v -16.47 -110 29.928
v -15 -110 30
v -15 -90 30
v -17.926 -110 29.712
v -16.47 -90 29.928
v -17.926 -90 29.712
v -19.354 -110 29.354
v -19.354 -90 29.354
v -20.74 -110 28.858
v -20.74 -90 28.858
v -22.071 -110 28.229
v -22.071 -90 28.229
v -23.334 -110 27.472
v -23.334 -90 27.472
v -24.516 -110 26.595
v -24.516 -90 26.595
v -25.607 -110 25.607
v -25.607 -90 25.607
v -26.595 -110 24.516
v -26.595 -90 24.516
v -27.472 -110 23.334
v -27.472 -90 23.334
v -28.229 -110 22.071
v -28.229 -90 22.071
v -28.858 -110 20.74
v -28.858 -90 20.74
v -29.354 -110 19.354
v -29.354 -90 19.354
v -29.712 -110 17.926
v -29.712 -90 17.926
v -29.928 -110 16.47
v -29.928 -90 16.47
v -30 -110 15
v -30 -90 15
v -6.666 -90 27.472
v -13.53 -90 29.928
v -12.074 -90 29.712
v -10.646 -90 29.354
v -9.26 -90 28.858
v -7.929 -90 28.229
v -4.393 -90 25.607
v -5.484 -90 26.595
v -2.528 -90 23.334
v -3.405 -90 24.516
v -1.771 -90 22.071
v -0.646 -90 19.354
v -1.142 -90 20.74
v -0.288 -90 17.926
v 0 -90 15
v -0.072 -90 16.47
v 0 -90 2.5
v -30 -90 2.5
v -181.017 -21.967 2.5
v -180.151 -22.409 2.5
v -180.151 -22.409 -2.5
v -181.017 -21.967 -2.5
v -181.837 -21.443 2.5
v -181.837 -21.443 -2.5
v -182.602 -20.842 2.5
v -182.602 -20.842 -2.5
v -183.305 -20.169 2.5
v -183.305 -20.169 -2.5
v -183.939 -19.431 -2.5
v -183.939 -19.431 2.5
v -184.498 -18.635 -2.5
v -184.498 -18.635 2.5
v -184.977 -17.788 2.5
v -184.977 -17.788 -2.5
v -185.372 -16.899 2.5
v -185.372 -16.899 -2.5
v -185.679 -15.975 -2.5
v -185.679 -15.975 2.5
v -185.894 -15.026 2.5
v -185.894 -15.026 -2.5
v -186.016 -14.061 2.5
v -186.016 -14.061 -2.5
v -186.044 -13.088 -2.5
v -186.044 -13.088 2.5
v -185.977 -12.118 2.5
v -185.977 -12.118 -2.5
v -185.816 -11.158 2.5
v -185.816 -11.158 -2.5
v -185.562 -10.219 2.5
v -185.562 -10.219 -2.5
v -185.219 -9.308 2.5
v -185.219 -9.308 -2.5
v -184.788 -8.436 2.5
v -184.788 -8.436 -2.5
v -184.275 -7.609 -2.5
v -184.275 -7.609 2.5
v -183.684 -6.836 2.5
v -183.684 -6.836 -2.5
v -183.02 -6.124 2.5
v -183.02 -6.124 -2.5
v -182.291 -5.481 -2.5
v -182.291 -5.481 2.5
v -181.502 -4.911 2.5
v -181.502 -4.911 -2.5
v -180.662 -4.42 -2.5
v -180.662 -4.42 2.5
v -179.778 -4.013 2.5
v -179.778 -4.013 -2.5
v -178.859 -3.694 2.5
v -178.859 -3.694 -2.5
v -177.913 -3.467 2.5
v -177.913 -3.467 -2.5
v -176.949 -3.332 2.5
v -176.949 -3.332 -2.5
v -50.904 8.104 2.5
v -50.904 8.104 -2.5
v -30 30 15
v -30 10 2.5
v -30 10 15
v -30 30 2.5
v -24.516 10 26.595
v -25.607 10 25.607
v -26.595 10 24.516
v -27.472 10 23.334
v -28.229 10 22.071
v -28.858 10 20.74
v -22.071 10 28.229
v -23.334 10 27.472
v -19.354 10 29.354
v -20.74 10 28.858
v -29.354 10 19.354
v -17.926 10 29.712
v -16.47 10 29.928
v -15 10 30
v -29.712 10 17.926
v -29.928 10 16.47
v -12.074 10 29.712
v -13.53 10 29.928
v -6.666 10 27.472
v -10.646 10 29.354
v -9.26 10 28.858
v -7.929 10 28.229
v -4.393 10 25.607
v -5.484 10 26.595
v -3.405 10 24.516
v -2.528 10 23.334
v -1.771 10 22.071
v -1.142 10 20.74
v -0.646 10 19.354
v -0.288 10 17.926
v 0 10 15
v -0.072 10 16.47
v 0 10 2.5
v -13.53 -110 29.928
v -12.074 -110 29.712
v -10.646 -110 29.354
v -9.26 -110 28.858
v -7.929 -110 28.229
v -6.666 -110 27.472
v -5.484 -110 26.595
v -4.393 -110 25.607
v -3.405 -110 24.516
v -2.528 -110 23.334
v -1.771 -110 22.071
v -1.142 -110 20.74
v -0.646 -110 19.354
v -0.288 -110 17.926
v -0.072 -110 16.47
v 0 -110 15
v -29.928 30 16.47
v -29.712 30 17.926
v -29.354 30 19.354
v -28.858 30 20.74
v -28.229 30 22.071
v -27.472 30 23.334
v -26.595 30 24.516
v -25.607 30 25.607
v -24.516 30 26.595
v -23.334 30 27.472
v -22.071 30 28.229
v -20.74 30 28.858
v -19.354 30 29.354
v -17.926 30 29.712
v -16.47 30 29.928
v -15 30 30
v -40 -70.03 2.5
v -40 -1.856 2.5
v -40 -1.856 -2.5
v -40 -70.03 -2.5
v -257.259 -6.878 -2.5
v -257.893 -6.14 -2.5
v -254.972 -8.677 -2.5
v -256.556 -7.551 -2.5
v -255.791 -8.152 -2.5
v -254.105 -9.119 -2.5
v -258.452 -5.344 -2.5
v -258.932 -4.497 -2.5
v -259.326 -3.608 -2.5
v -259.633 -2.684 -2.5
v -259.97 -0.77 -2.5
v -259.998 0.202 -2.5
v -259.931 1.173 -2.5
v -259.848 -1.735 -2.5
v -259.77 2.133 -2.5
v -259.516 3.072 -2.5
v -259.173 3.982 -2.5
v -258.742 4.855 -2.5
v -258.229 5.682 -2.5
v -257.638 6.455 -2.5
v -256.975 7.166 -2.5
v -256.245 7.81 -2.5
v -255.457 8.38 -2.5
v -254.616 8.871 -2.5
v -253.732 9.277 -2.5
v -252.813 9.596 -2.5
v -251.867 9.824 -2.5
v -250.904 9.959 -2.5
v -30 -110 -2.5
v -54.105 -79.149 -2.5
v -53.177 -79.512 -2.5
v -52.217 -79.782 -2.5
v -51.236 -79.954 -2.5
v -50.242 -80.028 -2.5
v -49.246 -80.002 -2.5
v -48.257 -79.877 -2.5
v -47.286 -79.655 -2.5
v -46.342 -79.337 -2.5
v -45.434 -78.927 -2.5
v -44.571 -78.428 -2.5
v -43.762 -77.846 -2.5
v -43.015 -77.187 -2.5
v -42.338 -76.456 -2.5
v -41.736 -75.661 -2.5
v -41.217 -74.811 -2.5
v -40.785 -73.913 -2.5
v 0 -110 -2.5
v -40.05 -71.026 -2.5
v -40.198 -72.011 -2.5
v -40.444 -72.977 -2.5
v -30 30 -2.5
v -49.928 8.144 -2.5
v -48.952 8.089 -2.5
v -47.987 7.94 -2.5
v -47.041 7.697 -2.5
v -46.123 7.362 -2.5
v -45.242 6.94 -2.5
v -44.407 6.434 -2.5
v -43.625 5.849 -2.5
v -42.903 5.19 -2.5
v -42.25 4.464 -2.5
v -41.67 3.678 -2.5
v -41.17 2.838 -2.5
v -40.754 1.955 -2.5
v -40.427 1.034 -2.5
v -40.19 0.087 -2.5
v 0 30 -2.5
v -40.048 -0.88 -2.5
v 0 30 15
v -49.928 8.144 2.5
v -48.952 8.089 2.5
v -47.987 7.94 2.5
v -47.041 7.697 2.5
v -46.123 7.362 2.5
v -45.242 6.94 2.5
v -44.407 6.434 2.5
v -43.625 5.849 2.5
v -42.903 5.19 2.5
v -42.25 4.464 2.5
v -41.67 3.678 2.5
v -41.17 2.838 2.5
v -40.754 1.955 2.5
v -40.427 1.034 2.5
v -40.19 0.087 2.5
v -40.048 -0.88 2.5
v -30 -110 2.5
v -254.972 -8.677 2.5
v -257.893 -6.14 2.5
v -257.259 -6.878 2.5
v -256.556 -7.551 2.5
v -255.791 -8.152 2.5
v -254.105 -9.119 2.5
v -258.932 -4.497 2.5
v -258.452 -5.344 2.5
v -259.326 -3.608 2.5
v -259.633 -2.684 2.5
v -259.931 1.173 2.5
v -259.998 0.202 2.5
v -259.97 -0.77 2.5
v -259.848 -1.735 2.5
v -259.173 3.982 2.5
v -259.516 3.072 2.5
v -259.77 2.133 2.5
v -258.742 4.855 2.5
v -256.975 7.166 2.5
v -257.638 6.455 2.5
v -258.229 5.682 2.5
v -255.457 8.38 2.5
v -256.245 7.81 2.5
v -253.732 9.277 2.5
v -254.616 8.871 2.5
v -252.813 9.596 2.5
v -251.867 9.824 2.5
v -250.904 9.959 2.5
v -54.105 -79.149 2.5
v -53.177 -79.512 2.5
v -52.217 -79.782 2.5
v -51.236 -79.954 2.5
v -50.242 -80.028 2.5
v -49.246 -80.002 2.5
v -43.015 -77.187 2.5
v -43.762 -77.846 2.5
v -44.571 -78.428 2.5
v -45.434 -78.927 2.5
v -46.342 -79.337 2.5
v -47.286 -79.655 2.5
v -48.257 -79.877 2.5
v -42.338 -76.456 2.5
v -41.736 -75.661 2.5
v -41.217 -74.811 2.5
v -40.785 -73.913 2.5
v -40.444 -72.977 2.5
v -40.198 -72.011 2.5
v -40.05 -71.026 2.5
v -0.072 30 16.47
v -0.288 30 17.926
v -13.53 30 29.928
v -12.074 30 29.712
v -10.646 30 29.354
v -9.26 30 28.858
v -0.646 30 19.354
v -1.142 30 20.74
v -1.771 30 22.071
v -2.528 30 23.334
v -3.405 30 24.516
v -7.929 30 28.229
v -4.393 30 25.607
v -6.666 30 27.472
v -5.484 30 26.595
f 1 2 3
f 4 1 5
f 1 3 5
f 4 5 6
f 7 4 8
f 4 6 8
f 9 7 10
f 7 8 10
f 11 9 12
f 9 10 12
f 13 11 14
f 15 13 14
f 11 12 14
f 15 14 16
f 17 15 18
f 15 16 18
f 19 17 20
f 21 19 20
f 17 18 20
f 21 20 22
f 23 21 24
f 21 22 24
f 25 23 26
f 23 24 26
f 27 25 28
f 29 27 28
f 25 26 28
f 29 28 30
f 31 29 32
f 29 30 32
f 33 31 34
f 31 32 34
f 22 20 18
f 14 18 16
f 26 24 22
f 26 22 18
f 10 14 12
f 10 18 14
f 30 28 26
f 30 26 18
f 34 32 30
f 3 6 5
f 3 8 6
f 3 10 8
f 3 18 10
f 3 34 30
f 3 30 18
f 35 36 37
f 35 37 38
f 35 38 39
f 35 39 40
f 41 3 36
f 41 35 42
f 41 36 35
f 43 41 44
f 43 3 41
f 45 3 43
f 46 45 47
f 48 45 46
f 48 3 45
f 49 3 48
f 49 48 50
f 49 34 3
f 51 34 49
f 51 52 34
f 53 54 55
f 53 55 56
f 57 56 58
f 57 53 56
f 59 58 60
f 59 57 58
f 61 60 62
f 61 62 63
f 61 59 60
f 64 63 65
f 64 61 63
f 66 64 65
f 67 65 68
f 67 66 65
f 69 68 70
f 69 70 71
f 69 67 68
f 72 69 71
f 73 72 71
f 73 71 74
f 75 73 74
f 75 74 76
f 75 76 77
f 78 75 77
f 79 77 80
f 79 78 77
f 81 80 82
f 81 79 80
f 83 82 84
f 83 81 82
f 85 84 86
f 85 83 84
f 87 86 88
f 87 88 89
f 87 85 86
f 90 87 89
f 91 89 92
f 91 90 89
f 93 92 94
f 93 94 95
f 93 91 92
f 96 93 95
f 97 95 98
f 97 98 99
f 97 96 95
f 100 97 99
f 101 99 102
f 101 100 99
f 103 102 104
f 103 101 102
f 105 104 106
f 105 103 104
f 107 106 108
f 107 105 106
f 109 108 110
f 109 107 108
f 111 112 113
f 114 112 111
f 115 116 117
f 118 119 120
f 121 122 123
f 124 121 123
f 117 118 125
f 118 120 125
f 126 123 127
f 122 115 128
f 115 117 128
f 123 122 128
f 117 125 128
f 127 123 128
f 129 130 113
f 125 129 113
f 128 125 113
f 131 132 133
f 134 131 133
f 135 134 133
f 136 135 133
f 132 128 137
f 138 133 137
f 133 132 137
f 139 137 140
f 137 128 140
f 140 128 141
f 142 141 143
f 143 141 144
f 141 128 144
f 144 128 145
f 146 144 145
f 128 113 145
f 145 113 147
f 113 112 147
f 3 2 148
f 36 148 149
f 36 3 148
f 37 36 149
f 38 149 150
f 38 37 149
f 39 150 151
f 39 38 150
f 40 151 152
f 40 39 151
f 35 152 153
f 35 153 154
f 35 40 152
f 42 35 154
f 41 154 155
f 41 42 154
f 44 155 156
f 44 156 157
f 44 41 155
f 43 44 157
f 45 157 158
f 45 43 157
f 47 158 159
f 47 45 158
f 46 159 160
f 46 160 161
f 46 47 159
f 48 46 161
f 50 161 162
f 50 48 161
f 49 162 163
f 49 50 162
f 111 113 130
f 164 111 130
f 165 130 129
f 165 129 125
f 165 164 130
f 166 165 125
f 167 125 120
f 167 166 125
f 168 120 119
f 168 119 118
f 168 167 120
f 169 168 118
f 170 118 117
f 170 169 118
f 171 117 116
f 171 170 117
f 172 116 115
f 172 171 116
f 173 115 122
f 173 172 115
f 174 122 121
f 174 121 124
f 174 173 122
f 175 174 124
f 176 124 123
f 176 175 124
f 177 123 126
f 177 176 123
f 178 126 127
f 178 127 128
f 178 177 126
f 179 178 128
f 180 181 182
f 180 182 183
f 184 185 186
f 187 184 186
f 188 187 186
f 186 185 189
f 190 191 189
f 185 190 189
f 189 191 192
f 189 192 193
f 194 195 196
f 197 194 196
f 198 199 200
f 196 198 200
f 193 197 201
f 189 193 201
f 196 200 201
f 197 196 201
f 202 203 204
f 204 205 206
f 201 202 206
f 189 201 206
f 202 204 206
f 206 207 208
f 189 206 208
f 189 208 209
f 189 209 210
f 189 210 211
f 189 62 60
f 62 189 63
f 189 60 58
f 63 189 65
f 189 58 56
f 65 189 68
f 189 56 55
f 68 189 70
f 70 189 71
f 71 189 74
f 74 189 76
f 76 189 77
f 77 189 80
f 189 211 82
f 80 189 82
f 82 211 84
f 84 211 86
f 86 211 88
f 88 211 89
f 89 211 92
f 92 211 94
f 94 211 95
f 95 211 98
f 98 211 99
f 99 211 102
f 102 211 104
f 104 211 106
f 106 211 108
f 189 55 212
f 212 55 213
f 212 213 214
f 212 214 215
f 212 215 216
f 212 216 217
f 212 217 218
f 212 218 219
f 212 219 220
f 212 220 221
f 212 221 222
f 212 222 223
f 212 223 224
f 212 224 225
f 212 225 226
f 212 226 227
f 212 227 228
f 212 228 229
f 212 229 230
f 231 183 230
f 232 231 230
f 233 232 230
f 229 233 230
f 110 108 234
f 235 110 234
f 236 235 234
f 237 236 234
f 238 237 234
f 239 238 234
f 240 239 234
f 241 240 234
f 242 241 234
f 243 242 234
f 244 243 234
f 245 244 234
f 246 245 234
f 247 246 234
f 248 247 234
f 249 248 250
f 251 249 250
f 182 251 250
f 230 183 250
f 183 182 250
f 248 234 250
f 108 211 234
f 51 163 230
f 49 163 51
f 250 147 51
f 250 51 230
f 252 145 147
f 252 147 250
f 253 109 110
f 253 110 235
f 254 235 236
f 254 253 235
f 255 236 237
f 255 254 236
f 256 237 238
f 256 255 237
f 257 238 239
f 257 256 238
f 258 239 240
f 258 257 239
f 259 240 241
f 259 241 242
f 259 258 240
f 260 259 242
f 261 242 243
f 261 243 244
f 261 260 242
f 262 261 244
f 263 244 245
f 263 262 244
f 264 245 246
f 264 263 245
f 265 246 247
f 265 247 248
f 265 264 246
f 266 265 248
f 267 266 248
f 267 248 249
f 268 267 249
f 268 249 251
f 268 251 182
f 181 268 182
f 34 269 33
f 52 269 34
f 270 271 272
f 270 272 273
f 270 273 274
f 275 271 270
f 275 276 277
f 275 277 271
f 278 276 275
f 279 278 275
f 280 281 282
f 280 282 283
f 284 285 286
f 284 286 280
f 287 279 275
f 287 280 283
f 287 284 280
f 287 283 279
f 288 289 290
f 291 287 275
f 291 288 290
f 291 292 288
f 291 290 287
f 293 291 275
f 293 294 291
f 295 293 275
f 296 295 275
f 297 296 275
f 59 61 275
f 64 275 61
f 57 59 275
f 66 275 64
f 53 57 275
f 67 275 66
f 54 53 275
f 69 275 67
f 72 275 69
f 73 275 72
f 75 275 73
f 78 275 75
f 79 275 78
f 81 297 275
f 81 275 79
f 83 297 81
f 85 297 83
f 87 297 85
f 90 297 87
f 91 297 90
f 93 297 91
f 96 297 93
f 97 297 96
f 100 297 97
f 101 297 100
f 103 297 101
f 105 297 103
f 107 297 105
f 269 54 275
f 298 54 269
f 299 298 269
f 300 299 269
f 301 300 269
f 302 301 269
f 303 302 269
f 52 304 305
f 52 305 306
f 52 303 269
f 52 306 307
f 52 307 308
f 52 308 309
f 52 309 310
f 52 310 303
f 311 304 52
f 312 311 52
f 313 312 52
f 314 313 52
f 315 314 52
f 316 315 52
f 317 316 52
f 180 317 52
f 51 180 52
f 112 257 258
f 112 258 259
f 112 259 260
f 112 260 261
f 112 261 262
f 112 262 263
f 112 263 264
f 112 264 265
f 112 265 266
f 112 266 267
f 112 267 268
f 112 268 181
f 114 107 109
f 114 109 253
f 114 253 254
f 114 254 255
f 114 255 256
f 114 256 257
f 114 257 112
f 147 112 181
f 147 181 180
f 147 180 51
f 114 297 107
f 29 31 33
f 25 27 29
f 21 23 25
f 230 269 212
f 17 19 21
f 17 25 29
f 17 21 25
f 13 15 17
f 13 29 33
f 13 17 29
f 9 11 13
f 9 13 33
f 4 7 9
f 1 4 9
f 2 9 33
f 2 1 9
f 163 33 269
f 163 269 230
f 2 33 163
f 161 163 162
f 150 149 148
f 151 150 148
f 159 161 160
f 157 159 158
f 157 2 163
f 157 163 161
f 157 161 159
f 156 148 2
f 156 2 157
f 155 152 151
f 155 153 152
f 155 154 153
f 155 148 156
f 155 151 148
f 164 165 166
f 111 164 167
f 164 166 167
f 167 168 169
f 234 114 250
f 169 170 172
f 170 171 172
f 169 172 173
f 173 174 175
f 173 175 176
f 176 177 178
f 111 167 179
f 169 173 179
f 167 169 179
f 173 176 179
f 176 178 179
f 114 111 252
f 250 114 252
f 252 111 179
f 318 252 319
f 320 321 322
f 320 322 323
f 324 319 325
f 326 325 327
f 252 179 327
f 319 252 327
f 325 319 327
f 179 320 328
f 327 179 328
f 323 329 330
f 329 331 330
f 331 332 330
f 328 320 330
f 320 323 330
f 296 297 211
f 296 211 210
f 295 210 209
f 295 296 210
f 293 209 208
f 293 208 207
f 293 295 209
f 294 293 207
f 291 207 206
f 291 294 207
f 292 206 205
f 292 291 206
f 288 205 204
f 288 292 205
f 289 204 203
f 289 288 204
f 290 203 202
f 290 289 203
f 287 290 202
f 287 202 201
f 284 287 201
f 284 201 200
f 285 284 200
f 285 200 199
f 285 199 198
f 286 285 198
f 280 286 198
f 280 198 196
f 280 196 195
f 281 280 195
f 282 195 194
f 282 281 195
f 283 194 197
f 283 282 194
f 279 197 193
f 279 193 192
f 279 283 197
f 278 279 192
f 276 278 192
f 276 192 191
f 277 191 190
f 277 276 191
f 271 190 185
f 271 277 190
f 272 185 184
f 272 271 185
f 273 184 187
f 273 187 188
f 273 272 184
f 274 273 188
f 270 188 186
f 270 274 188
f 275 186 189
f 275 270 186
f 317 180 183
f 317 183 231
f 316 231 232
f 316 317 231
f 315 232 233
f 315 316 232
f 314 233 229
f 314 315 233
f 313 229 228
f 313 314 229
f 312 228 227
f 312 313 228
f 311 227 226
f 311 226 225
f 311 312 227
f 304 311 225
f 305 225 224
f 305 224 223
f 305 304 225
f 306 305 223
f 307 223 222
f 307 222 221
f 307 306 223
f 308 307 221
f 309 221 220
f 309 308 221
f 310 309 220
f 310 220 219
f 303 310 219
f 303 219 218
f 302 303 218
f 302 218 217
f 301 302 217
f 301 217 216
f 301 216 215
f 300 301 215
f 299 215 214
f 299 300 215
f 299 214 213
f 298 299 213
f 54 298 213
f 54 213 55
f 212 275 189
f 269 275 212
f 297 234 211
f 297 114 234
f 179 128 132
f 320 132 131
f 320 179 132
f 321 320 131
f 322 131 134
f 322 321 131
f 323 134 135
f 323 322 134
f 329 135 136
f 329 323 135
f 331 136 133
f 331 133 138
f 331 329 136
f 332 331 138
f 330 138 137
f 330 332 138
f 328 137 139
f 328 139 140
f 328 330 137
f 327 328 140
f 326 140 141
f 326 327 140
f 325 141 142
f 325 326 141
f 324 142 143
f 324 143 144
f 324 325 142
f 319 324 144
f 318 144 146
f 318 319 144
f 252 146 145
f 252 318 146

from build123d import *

# Parameters (mm, degrees)
F0_W     = 30
F0_H     = 20
F0_H_2   = 100
F1_DEPTH = 2.5
F2_DEPTH = 30
F3_R     = 14.99999


# Not quite as in the source:
# - a fillet or chamfer is up to 0.001 mm smaller than in the source, because OpenCascade refuses the exact size


with BuildPart() as f1:
    # F0 (on Top) → F1 (new body, symmetric)
    with BuildSketch(Plane.XY):
        with BuildLine():
            Line((-30, 10), (-30, 30))
            Line((-30, 30), (-250.9035135708, 9.9590995189))
            ThreePointArc((-250.9035135708, 9.9590995189), (-243.2559335601, 7.3836012794), (-240, 0))
            ThreePointArc((-240, 0), (-244.5708205421, -8.3978574895), (-254.1048020827, -9.1186950745))
            Line((-254.1048020827, -9.1186950745), (-30, -110))
            Line((-30, -110), (-30, -90))
            Line((-30, -90), (-30, 10))
        make_face()
        with BuildLine():
            ThreePointArc((-50.9035135708, 8.1035827434), (-43.2559335601, 5.5280845039), (-40, -1.8555167755))
            Line((-40, -1.8555167755), (-40, -70.0304714473))
            ThreePointArc((-40, -70.0304714473), (-44.5708205421, -78.4283289367), (-54.1048020827, -79.1491665218))
            Line((-54.1048020827, -79.1491665218), (-180.1505302804, -22.409384854))
            ThreePointArc((-180.1505302804, -22.409384854), (-185.9078460259, -11.6358085325), (-176.9492417684, -3.3315902606))
            Line((-176.9492417684, -3.3315902606), (-50.9035135708, 8.1035827434))
        make_face(mode=Mode.SUBTRACT)
        with BuildLine():
            ThreePointArc((-240, 0), (-243.2559335601, 7.3836012794), (-250.9035135708, 9.9590995189))
            ThreePointArc((-250.9035135708, 9.9590995189), (-259.8621178282, 1.654881247), (-254.1048020827, -9.1186950745))
            ThreePointArc((-254.1048020827, -9.1186950745), (-244.5708205421, -8.3978574895), (-240, 0))
        make_face()
        with Locations((-15, 20)):
            Rectangle(F0_W, F0_H)
        with Locations((-15, -40)):
            Rectangle(F0_W, F0_H_2)
        with Locations((-15, -100)):
            Rectangle(F0_W, F0_H)
    extrude(amount=F1_DEPTH, both=True)

    # F0 (on Top) → F2 (join)
    with BuildSketch(Plane.XY):
        with Locations((-15, 20)):
            Rectangle(F0_W, F0_H)
        with Locations((-15, -100)):
            Rectangle(F0_W, F0_H)
    extrude(amount=F2_DEPTH)

    # F3 (radius 15 in the source; OpenCascade refuses exactly that, so slightly less here)
    f3_edges = [f1.edges().sort_by_distance(p)[0] for p in [
        (0, 20, 30),
        (-30, 20, 30),
        (0, -100, 30),
        (-30, -100, 30),
    ]]
    fillet(f3_edges, radius=F3_R)


solid = f1.part
